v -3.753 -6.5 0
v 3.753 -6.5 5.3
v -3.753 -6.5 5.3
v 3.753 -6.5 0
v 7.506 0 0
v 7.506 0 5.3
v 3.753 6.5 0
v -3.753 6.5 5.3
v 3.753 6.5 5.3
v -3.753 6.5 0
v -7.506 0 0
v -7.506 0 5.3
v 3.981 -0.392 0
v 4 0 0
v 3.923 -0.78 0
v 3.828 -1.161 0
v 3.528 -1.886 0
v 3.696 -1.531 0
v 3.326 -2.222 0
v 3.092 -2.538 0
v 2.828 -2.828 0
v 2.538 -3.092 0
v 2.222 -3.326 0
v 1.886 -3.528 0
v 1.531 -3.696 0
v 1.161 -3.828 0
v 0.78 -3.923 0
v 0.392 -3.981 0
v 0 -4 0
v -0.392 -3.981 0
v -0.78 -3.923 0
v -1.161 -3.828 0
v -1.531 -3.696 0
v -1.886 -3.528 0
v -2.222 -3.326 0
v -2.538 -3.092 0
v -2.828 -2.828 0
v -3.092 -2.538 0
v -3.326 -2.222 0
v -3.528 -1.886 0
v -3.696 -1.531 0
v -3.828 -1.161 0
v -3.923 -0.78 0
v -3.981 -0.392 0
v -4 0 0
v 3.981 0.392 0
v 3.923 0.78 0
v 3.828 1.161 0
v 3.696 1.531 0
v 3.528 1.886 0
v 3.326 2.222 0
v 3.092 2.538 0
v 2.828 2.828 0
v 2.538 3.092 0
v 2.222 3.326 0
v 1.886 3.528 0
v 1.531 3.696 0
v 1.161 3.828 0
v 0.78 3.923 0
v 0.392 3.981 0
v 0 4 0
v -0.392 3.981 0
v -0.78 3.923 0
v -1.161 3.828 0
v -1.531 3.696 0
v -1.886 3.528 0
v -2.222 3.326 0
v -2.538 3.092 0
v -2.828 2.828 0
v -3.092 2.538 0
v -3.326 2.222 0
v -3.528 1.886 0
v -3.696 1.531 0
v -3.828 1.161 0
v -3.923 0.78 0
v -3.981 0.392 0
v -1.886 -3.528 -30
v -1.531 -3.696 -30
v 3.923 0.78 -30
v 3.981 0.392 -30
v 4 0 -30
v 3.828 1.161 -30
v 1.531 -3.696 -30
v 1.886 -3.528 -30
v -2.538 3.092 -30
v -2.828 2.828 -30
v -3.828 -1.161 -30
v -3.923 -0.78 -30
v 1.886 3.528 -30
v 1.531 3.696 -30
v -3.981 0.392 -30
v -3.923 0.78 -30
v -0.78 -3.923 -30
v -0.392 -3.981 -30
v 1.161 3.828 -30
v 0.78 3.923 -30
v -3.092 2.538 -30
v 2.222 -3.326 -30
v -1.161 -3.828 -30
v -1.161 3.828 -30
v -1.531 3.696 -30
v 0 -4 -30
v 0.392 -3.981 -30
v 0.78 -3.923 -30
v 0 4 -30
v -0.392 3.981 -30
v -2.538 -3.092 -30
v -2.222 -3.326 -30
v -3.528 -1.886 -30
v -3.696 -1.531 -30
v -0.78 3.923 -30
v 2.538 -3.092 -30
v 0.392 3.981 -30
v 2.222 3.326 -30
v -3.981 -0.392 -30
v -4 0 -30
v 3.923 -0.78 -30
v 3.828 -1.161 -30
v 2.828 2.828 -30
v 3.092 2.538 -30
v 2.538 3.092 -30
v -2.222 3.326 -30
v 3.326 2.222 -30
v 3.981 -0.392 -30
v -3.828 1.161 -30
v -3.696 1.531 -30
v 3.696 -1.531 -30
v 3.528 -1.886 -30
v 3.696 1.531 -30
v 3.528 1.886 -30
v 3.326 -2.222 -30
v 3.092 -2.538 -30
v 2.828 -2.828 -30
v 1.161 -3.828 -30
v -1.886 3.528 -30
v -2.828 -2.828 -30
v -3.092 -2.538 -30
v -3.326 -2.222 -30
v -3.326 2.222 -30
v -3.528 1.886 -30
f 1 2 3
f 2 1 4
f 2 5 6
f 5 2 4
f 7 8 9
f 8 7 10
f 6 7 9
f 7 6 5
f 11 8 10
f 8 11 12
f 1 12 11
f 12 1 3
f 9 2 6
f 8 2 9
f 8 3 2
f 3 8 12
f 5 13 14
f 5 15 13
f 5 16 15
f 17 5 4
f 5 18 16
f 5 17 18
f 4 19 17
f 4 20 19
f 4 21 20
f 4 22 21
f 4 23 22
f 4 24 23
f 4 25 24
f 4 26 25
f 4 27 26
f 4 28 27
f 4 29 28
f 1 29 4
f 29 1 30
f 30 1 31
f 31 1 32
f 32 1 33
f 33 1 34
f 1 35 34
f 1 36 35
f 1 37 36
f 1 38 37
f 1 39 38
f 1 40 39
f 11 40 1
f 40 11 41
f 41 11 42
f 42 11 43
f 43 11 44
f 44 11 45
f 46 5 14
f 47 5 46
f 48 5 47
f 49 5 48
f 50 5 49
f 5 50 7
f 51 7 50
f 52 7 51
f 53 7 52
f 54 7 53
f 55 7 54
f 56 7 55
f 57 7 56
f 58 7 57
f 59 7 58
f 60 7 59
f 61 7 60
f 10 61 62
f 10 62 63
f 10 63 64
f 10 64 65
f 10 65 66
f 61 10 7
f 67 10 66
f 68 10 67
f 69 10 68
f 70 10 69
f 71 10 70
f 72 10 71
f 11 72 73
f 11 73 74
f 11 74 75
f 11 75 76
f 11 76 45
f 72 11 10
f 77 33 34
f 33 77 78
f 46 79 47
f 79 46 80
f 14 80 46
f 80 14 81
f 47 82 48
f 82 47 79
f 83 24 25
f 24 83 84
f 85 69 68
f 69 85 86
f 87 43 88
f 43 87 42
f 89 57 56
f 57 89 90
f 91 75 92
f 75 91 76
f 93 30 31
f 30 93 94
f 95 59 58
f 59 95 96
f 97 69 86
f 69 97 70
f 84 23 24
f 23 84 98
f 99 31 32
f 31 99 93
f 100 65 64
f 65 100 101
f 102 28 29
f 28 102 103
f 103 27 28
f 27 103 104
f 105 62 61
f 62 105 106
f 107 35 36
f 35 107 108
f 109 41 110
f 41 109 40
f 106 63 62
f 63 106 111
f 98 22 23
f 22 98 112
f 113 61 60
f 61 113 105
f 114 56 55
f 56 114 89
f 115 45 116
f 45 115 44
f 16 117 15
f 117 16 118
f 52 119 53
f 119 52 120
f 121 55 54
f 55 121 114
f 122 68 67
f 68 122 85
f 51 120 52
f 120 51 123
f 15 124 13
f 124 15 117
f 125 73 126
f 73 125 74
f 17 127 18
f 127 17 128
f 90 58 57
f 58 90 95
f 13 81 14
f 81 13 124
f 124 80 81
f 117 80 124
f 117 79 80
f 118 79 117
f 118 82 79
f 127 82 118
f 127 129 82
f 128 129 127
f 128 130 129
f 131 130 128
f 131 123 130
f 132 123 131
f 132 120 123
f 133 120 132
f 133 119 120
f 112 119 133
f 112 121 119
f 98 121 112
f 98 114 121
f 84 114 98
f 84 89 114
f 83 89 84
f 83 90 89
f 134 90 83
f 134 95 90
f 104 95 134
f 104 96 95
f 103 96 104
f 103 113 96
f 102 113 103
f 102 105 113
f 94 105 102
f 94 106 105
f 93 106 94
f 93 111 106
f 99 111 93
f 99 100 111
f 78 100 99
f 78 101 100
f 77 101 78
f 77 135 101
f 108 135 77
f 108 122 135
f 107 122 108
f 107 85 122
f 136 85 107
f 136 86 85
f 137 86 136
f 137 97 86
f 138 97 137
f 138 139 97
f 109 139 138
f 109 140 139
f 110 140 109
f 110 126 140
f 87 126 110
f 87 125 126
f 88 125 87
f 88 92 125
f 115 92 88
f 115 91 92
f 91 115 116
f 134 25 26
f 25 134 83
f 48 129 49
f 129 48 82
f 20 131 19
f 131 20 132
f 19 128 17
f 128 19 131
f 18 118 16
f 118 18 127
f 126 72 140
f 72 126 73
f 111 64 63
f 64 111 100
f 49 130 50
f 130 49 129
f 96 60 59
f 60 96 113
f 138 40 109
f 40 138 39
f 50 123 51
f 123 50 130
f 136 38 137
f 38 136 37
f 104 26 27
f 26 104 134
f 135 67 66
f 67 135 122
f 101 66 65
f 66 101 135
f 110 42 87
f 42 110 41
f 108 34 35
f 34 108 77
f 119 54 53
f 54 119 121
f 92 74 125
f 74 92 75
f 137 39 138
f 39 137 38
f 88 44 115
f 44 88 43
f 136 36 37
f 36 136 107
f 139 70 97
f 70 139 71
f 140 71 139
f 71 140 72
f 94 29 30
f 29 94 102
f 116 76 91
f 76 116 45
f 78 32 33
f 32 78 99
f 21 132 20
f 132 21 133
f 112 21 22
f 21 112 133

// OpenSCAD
// Parameters
head_across = 13;    // across-flats distance for hex head (mm)
head_height = 5.3;   // head height (mm)
shank_d    = 8;      // shank diameter (mm)
shank_len  = 30;     // shank length (mm)

// Compute circumscribed diameter for hexagon to achieve desired across-flats
head_d = head_across * 2 / sqrt(3);

union() {
    // Hex head, from z=0 to z=head_height
    cylinder(h = head_height, d = head_d, $fn = 6);
    // Shank, from z=-shank_len to z=0
    translate([0, 0, -shank_len])
        cylinder(h = shank_len, d = shank_d, $fn = 64);
}
